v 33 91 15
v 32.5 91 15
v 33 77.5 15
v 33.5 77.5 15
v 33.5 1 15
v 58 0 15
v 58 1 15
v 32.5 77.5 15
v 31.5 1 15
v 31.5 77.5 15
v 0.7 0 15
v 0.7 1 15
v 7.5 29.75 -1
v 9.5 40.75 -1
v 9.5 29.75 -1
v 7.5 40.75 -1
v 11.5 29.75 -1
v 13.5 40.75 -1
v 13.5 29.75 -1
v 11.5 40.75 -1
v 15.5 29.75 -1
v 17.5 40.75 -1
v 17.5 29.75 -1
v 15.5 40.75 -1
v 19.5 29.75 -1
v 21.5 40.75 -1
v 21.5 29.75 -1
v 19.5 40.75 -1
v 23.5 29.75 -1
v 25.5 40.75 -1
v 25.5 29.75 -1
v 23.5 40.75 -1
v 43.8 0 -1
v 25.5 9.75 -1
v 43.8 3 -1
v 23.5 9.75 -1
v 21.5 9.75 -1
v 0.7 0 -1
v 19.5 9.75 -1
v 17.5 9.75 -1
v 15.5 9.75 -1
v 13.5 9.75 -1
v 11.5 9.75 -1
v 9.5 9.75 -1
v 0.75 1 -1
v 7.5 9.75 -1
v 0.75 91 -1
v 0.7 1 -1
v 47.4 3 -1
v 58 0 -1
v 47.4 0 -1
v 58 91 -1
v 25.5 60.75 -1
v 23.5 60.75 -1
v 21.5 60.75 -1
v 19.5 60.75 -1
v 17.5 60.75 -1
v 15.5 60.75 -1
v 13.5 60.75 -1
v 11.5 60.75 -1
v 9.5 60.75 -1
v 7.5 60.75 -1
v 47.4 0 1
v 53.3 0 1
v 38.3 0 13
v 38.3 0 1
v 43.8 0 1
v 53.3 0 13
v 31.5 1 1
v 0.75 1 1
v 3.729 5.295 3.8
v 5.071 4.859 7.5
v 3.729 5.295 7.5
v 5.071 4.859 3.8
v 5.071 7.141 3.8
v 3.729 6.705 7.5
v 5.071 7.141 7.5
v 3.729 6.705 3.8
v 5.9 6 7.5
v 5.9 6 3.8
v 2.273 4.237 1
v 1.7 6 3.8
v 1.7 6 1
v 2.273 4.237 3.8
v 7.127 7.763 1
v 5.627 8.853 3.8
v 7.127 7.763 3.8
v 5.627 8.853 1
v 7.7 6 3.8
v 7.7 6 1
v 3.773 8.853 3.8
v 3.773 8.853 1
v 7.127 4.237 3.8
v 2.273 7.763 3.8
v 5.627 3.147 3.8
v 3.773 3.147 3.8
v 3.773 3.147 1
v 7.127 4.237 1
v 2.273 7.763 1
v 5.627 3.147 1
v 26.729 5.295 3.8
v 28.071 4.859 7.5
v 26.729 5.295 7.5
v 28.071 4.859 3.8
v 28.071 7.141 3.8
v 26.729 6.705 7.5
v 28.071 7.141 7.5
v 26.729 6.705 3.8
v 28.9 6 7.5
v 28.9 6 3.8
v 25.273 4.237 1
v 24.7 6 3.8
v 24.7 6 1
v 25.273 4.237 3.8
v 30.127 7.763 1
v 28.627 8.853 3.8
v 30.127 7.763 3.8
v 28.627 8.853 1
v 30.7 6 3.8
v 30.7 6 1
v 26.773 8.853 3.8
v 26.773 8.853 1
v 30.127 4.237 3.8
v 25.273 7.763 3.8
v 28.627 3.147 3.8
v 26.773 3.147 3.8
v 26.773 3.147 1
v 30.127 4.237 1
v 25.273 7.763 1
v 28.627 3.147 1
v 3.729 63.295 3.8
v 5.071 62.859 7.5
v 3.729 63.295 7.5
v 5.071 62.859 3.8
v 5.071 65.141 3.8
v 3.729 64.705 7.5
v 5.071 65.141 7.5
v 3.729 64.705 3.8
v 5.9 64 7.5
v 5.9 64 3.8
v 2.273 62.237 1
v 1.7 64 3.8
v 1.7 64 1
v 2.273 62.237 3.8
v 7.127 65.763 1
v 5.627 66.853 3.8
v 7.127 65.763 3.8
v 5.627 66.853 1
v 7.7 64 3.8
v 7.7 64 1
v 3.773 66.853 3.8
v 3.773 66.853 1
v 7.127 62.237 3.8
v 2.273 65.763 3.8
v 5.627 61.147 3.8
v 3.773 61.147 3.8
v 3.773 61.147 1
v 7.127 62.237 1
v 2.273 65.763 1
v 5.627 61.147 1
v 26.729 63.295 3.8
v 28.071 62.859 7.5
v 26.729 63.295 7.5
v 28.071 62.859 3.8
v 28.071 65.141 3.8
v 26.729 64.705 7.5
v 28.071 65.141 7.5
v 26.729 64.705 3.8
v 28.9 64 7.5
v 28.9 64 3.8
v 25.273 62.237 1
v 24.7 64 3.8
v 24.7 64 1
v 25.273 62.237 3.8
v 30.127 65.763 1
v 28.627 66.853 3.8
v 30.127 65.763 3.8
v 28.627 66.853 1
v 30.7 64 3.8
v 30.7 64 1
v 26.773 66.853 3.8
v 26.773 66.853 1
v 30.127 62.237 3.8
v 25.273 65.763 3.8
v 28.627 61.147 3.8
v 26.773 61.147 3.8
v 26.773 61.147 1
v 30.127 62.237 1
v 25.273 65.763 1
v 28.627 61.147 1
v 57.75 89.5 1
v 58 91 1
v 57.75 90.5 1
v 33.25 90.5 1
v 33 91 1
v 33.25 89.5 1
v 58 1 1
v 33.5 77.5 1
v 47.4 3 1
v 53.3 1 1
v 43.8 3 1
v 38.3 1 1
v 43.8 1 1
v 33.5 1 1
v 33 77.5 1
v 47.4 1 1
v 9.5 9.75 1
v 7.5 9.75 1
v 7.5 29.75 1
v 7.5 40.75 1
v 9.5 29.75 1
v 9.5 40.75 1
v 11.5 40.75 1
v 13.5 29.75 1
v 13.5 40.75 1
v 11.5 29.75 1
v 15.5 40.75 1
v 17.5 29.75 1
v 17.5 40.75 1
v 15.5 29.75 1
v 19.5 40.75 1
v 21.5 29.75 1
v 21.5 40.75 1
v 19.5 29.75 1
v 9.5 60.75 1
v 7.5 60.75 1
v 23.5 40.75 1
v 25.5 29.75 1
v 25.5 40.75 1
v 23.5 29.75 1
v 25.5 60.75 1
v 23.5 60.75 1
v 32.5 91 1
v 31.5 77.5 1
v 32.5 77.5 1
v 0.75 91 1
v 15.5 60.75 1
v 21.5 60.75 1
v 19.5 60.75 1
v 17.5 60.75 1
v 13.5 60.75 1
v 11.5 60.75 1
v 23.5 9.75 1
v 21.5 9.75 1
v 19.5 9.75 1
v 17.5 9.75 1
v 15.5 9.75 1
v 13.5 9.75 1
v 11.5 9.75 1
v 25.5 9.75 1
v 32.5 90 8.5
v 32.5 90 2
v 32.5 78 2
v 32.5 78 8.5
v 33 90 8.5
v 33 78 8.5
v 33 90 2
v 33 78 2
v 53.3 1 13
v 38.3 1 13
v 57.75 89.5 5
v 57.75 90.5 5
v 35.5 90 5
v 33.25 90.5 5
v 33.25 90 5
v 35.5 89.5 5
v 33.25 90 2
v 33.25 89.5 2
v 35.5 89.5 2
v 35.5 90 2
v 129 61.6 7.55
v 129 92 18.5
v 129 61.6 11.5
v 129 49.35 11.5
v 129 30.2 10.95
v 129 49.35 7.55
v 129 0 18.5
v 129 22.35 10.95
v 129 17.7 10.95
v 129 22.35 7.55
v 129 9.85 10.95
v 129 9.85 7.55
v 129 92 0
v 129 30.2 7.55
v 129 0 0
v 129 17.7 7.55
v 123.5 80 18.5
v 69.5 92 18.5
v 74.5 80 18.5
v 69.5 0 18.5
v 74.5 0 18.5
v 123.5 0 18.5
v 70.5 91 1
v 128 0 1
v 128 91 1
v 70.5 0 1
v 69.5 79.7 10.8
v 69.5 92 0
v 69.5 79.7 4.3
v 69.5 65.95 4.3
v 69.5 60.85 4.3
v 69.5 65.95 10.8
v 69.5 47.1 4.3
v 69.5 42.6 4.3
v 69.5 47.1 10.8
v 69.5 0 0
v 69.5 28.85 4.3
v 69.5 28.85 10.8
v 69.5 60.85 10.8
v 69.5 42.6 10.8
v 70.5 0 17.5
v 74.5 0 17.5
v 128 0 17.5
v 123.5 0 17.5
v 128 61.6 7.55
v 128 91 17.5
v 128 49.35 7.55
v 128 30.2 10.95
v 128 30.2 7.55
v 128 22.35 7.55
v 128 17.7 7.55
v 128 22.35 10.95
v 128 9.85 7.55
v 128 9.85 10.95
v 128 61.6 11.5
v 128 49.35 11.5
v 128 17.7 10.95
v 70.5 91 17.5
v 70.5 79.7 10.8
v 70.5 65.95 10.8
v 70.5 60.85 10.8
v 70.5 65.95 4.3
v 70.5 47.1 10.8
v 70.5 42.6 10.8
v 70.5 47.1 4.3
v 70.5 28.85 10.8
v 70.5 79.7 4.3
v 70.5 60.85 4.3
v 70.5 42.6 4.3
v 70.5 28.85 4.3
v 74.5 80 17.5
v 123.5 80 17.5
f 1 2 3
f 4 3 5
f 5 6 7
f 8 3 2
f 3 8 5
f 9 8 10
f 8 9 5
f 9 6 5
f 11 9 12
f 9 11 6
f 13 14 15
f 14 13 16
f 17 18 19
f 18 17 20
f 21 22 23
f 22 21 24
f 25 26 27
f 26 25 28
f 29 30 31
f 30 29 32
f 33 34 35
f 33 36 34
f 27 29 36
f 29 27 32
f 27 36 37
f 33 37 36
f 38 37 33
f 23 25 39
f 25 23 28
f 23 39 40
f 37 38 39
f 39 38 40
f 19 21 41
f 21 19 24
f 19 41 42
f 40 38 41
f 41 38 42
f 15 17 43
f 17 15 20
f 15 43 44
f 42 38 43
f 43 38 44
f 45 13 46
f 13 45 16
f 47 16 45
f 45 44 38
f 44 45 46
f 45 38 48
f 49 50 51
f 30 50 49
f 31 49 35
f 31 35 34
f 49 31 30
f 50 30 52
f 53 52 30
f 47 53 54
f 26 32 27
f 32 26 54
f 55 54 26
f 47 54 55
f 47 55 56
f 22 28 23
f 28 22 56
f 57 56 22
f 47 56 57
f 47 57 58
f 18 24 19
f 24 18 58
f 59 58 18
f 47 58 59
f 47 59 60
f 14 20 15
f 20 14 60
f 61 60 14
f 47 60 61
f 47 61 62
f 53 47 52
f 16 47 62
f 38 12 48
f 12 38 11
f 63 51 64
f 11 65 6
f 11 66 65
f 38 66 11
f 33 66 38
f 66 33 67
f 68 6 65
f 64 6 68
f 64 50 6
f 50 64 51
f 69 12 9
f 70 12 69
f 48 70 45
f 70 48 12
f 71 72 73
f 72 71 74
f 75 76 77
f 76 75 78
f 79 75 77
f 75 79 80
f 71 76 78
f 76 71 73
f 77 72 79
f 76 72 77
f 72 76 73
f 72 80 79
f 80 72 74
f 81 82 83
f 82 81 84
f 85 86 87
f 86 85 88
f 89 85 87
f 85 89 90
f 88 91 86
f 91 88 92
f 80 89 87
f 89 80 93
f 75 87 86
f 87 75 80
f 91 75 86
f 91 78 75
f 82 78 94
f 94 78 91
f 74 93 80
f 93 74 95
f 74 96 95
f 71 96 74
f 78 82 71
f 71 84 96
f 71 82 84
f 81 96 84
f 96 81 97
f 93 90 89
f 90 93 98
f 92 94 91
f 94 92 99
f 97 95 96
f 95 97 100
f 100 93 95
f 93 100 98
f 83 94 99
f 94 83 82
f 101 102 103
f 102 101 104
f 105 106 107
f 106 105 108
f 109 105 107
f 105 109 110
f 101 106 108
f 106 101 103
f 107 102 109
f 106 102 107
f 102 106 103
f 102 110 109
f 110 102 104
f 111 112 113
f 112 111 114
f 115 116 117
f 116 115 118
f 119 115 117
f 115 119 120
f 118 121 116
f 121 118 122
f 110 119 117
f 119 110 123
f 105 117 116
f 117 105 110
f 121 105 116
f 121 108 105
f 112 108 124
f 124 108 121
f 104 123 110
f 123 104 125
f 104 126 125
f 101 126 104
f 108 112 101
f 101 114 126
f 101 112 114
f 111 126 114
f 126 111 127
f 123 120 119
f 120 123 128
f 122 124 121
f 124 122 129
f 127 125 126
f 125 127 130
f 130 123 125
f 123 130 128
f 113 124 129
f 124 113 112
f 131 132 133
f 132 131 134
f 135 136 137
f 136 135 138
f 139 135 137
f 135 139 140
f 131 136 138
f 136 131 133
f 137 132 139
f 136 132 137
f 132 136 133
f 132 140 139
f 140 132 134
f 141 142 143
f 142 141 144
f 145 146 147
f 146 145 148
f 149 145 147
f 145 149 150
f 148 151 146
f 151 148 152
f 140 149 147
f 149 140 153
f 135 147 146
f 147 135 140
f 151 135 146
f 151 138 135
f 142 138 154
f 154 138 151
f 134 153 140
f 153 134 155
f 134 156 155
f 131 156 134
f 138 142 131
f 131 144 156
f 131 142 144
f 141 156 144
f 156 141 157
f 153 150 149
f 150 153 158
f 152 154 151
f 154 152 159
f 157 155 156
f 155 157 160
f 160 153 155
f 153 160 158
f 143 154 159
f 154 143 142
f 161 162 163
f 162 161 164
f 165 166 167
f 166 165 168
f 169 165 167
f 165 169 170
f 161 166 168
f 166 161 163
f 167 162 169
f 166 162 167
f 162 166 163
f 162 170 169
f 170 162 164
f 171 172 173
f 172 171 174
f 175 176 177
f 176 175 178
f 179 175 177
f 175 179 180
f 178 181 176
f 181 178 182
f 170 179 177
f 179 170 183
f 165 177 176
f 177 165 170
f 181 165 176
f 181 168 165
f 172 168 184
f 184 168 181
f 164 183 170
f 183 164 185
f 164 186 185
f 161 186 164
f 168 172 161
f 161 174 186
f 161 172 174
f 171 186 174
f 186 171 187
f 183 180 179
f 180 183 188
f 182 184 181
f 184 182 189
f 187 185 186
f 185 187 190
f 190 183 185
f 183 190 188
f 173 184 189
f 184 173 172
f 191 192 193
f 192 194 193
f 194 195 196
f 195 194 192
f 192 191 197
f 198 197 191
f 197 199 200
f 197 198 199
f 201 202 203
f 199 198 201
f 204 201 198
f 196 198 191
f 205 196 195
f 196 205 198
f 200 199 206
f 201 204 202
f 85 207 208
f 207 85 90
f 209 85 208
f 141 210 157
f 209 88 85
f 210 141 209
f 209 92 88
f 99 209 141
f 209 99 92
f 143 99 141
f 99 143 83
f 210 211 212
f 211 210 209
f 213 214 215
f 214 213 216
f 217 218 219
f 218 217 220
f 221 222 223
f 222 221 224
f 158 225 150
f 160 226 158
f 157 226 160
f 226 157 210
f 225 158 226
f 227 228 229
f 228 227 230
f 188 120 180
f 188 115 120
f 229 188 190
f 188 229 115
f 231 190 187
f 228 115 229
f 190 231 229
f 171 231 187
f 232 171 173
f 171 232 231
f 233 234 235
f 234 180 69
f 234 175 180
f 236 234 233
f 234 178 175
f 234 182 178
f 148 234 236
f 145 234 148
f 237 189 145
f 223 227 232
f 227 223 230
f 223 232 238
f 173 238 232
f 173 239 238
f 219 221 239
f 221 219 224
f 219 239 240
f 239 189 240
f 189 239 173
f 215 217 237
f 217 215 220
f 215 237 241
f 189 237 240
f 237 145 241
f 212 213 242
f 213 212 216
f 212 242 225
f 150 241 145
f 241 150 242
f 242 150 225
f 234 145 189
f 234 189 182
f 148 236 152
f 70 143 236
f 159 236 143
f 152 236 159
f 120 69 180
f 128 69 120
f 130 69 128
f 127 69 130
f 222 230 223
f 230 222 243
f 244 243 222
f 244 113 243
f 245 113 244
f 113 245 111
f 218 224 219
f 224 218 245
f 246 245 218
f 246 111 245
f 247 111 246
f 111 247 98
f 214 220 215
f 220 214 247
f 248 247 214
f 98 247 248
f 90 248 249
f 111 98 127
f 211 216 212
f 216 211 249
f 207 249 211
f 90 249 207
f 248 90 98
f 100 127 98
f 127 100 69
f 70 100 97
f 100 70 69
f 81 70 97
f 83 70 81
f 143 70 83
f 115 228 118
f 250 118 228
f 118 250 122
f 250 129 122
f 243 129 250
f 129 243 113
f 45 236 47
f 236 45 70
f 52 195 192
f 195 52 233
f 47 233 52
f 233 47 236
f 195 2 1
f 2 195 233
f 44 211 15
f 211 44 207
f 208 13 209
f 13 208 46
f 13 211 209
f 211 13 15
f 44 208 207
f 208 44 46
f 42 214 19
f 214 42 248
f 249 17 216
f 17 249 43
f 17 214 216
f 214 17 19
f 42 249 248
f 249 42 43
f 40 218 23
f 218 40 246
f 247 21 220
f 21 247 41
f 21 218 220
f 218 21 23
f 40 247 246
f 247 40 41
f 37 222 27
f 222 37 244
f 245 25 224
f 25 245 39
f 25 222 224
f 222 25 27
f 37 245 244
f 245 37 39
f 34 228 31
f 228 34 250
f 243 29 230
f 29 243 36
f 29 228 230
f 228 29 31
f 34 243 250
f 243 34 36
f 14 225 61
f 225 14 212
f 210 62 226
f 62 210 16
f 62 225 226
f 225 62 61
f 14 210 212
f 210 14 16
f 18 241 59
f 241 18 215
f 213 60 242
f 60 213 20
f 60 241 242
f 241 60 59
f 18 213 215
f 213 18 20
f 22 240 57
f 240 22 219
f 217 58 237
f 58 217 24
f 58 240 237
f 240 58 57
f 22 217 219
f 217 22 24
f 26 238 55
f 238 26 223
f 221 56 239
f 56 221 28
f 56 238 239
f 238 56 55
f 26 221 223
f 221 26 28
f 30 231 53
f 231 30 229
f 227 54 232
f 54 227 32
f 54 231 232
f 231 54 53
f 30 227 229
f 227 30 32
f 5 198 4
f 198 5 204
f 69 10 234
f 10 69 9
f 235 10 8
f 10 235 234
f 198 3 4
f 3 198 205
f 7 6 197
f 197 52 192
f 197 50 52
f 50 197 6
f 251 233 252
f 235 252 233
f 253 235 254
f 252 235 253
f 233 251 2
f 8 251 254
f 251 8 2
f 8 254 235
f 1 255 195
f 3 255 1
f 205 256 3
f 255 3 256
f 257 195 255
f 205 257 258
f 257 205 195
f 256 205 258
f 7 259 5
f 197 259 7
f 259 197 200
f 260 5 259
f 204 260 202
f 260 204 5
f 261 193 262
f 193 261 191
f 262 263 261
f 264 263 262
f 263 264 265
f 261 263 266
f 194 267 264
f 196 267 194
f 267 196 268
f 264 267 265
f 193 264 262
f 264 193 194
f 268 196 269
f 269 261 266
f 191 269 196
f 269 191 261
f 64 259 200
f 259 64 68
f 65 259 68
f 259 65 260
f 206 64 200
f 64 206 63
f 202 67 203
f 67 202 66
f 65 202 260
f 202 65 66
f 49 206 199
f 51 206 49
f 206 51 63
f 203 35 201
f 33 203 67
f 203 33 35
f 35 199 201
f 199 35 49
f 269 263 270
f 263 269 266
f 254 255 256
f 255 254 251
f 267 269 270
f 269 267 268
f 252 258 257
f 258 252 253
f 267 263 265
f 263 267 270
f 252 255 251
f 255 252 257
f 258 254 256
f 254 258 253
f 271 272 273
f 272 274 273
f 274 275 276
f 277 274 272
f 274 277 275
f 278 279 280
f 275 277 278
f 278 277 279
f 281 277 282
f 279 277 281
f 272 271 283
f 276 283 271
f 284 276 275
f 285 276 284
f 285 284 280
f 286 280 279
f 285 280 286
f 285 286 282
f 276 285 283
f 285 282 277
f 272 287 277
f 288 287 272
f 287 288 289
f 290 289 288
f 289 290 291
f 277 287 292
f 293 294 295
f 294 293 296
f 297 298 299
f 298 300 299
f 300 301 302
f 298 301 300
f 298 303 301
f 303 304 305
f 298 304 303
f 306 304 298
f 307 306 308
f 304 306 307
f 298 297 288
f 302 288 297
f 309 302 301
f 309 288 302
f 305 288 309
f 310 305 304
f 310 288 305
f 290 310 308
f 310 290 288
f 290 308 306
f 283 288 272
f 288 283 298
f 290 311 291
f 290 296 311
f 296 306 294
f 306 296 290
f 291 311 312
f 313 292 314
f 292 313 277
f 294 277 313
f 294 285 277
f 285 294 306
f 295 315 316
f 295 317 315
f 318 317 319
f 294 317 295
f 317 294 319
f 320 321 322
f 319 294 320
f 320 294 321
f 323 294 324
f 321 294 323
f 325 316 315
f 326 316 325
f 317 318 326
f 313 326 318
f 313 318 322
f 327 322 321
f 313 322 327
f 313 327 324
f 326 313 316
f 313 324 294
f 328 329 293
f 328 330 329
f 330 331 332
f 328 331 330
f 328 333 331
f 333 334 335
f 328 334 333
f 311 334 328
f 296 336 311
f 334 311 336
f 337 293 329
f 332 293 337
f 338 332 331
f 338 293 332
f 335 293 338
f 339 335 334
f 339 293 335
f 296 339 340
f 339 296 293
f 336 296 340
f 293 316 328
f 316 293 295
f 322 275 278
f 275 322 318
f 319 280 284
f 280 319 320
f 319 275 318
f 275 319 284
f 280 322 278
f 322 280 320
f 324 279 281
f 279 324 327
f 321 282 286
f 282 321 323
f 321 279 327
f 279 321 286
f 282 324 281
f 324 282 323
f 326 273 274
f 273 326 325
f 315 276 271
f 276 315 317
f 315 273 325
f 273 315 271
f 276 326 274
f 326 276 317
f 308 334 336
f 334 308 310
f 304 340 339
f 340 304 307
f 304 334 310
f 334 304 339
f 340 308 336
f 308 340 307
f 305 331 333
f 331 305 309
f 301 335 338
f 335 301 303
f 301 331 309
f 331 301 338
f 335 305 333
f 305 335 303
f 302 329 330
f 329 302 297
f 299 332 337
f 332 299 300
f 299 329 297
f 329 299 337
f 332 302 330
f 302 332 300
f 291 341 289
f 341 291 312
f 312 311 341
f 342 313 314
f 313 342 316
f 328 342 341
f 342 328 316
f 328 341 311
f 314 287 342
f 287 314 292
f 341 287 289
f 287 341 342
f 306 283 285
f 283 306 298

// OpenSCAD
use <MCAD/boxes.scad>
//use <OPENSCAD/Autobot_Latches.scad>

width = 25.5;
depth = 91;
height = 14;
wall = 2;

usb_height = 6.5;
usb_width = 2;
usb_depth = 13.75;

module rpi_hub(width=24.1, depth=90, height=14, wall=2){

    // The main hub case
    translate([width/2, depth/2,height/2]){
        difference(){
            // Account for the hub platform being 2 mm thick
            cube([width,depth,height+wall], true);
            translate([1,1,0]){
                cube([width-wall+3,depth,height+wall*2], true);
            }
        }
        // Holder for hub card
        translate([-12,44,-6]){
            cube([width-1,1,4]);
        }
    }

    // bottom portion
    translate([width/2, depth/2,0]){
        cube([width,depth,wall],true);
    }
}

// USB port
module usb_port(width=usb_width,depth=usb_depth,height=usb_height){ 
    //height=5.75; // z-axis
    //width=2;  // x-axis
   //depth=13.25; // y-axis
    cube([4, depth, height]);
}

module eth_jack(){
    //Ethernet Jack
    e_width = 15;
    e_height = 1;
    e_depth = 12.0;

    x = 5.8;
    y = 0;
    z = 1;
    translate([x,y,z]){
        cube([e_width, e_height, e_depth]);
        translate([5.5,0,-2]){
            cube([3.6, 3, 3]);
        }
    }
}

module eth_hub(){
    // USB Ports
    offset_z_1 = 6.4;
    offset_y_1 = 30.35;
    offset_x_1 = 24.1;
    
    offset_z_2 = 6.4;
    offset_y_2 = offset_y_1 + 6+ usb_depth;
    offset_x_2 = 24.1;
    
    offset_z_3 = 6.4;
    offset_y_3 = offset_y_2 + 4 + usb_depth;
    offset_x_3 = 24.1;
    
    difference(){
        // Bottom piece
        rpi_hub(width,depth,height,wall);
        
        // Ethernet
        eth_jack();
                
        // Power
        p_depth = 7.4;
        p_height = 6.5;
        p_width = 2;
    
        translate([-1,78,2]){
            cube([4, 12, 6.5]);
        }
    }
}

module usb_micro(x=0,y=0,z=0){
    usb_micro_port_width = 8.75-.9;
    usb_micro_port_height = 3.4;

        translate([x,y,z]){
            cube([wall,usb_micro_port_width,usb_micro_port_height]);
        }
}

module hdmi(x=0,y=0,z=0){
    hdmi_port_width = 12.25;
    hdmi_port_height = 4.25-.3;

        translate([x,y,z]){
            cube([wall,hdmi_port_width,hdmi_port_height]);
        }
}

module vent(x=0,y=0,z=0){
    translate([x,y,z]){
        cube([2,20,wall]);
    }
 }


// RPI
module rpi_box(){
    box_width = 33;
    box_depth =92;
    box_height = 14;
    wall = 2;
    
    usb_micro_port_width = 8.75;
    usb_micro_port_height = 3.4;
    
    hdmi_port_width = 12.25;
    hdmi_port_height = 4.25;

    // The main hub case
    translate([box_width/2+.25, box_depth/2,box_height/2]){
        difference(){
            // Account for the hub platform being 2 mm thick
            cube([box_width-.9,box_depth,box_height+wall], true);
            translate([1,1,0]){
                cube([box_width+1.5,box_depth,box_height+wall*2], true);
            }
        }
    }
    
    // bottom portion
    translate([box_width/2+.5, box_depth/2,0]){
        cube([box_width-.5,box_depth-2,wall],true);
    }

    translate([4.7,6,0]){
        cylinder(7.5, d=2.4);
        // rest portion
        cylinder(3.8,d=6);
    }

    translate([27.7,6,0]){
        cylinder(7.5, d=2.4);
        
        // rest portion
        cylinder(3.8,d=6);
    }

    translate([4.7,64,0]){
        cylinder(7.5, d=2.4);

        // rest portion
        cylinder(3.8,d=6);
    }

    translate([27.7,64,0]){
        cylinder(7.5, d=2.4);

        // rest portion
        cylinder(3.8,d=6);
    }

}

module rpi_bottom(){
    difference(){
        rpi_box(); 
    
        usb_micro(x=0,y=21+1.35,z=5.3);
        usb_micro(x=0,y=8.5+1.35,z=5.3);
        hdmi(x=0, y=48+1.35,z=4.8);   
        
        vent(x=7.5,y=9.75,z=-1);
        vent(x=11.5,y=9.75,z=-1);
        vent(x=15.5,y=9.75,z=-1);
        vent(x=19.5,y=9.75,z=-1);
        vent(x=23.5,y=9.75,z=-1);
    
        vent(x=7.5,y=40.75,z=-1);
        vent(x=11.5,y=40.75,z=-1);
        vent(x=15.5,y=40.75,z=-1);
        vent(x=19.5,y=40.75,z=-1);
        vent(x=23.5,y=40.75,z=-1);

    }
}


module lid(){
    
    offset_z_1 = 6.4;
    offset_y_1 = 30.35;
    offset_x_1 = 24.1;
    
    offset_z_2 = 6.4;
    offset_y_2 = offset_y_1 + 6+ usb_depth;
    offset_x_2 = 24.1;
    
    offset_z_3 = 6.4;
    offset_y_3 = offset_y_2 + 4 + usb_depth;
    offset_x_3 = 24.1;
    
    // outer casing
    difference(){
        translate([0,0,1]){
            difference(){
                cube([59.5,92,17.5]);
                translate([1,0,0]){
                    cube([57.5,91,17.5]);
                }
            }
        }
        
        // RPI ports
        usb_micro(x=58.5,y=21+1.35,z=5.55+wall);
        usb_micro(x=58.5,y=8.5+1.35,z=5.55+wall);
        hdmi(x=58.5, y=48+1.35,z=5.55+wall);   

        // USB Port 1
        translate([-1, offset_y_1-wall+.5,2.3+wall]){
            usb_port();
        }
    
        // USB Port 2
        translate([-1, offset_y_2-3,2.3+wall]){
            usb_port();
        }
        
        // USB Port 3
        translate([-1,offset_y_3-1.9,2.3+wall]){
            usb_port();
        }
    }

    // Y axis Rail
    translate([1,0,17.5]){
        cube([4,92,1]);
    }

    // Y axis Rail opposite side
    translate([54,0,17.5]){
        cube([5,92,1]);
    }

    // X axis rail
    translate([0,80,17.5]){
        cube([58,12,1]);
    }

    // Top portion
    cube([59.5,92,1]);

}

// RPI Housing 
translate([0,0,0]){
    rpi_bottom();
    translate([31.5,0,0]){
        cube([2,depth-13.5,15]);
    }
}
translate([32.5,0,0]){
    eth_hub();
}

// Outer Casing
translate([69.5, 0, 0]){
    rotate(a=[0,180,0]){
        rotate([0,180,0]){
            lid();
        }
    }
}
